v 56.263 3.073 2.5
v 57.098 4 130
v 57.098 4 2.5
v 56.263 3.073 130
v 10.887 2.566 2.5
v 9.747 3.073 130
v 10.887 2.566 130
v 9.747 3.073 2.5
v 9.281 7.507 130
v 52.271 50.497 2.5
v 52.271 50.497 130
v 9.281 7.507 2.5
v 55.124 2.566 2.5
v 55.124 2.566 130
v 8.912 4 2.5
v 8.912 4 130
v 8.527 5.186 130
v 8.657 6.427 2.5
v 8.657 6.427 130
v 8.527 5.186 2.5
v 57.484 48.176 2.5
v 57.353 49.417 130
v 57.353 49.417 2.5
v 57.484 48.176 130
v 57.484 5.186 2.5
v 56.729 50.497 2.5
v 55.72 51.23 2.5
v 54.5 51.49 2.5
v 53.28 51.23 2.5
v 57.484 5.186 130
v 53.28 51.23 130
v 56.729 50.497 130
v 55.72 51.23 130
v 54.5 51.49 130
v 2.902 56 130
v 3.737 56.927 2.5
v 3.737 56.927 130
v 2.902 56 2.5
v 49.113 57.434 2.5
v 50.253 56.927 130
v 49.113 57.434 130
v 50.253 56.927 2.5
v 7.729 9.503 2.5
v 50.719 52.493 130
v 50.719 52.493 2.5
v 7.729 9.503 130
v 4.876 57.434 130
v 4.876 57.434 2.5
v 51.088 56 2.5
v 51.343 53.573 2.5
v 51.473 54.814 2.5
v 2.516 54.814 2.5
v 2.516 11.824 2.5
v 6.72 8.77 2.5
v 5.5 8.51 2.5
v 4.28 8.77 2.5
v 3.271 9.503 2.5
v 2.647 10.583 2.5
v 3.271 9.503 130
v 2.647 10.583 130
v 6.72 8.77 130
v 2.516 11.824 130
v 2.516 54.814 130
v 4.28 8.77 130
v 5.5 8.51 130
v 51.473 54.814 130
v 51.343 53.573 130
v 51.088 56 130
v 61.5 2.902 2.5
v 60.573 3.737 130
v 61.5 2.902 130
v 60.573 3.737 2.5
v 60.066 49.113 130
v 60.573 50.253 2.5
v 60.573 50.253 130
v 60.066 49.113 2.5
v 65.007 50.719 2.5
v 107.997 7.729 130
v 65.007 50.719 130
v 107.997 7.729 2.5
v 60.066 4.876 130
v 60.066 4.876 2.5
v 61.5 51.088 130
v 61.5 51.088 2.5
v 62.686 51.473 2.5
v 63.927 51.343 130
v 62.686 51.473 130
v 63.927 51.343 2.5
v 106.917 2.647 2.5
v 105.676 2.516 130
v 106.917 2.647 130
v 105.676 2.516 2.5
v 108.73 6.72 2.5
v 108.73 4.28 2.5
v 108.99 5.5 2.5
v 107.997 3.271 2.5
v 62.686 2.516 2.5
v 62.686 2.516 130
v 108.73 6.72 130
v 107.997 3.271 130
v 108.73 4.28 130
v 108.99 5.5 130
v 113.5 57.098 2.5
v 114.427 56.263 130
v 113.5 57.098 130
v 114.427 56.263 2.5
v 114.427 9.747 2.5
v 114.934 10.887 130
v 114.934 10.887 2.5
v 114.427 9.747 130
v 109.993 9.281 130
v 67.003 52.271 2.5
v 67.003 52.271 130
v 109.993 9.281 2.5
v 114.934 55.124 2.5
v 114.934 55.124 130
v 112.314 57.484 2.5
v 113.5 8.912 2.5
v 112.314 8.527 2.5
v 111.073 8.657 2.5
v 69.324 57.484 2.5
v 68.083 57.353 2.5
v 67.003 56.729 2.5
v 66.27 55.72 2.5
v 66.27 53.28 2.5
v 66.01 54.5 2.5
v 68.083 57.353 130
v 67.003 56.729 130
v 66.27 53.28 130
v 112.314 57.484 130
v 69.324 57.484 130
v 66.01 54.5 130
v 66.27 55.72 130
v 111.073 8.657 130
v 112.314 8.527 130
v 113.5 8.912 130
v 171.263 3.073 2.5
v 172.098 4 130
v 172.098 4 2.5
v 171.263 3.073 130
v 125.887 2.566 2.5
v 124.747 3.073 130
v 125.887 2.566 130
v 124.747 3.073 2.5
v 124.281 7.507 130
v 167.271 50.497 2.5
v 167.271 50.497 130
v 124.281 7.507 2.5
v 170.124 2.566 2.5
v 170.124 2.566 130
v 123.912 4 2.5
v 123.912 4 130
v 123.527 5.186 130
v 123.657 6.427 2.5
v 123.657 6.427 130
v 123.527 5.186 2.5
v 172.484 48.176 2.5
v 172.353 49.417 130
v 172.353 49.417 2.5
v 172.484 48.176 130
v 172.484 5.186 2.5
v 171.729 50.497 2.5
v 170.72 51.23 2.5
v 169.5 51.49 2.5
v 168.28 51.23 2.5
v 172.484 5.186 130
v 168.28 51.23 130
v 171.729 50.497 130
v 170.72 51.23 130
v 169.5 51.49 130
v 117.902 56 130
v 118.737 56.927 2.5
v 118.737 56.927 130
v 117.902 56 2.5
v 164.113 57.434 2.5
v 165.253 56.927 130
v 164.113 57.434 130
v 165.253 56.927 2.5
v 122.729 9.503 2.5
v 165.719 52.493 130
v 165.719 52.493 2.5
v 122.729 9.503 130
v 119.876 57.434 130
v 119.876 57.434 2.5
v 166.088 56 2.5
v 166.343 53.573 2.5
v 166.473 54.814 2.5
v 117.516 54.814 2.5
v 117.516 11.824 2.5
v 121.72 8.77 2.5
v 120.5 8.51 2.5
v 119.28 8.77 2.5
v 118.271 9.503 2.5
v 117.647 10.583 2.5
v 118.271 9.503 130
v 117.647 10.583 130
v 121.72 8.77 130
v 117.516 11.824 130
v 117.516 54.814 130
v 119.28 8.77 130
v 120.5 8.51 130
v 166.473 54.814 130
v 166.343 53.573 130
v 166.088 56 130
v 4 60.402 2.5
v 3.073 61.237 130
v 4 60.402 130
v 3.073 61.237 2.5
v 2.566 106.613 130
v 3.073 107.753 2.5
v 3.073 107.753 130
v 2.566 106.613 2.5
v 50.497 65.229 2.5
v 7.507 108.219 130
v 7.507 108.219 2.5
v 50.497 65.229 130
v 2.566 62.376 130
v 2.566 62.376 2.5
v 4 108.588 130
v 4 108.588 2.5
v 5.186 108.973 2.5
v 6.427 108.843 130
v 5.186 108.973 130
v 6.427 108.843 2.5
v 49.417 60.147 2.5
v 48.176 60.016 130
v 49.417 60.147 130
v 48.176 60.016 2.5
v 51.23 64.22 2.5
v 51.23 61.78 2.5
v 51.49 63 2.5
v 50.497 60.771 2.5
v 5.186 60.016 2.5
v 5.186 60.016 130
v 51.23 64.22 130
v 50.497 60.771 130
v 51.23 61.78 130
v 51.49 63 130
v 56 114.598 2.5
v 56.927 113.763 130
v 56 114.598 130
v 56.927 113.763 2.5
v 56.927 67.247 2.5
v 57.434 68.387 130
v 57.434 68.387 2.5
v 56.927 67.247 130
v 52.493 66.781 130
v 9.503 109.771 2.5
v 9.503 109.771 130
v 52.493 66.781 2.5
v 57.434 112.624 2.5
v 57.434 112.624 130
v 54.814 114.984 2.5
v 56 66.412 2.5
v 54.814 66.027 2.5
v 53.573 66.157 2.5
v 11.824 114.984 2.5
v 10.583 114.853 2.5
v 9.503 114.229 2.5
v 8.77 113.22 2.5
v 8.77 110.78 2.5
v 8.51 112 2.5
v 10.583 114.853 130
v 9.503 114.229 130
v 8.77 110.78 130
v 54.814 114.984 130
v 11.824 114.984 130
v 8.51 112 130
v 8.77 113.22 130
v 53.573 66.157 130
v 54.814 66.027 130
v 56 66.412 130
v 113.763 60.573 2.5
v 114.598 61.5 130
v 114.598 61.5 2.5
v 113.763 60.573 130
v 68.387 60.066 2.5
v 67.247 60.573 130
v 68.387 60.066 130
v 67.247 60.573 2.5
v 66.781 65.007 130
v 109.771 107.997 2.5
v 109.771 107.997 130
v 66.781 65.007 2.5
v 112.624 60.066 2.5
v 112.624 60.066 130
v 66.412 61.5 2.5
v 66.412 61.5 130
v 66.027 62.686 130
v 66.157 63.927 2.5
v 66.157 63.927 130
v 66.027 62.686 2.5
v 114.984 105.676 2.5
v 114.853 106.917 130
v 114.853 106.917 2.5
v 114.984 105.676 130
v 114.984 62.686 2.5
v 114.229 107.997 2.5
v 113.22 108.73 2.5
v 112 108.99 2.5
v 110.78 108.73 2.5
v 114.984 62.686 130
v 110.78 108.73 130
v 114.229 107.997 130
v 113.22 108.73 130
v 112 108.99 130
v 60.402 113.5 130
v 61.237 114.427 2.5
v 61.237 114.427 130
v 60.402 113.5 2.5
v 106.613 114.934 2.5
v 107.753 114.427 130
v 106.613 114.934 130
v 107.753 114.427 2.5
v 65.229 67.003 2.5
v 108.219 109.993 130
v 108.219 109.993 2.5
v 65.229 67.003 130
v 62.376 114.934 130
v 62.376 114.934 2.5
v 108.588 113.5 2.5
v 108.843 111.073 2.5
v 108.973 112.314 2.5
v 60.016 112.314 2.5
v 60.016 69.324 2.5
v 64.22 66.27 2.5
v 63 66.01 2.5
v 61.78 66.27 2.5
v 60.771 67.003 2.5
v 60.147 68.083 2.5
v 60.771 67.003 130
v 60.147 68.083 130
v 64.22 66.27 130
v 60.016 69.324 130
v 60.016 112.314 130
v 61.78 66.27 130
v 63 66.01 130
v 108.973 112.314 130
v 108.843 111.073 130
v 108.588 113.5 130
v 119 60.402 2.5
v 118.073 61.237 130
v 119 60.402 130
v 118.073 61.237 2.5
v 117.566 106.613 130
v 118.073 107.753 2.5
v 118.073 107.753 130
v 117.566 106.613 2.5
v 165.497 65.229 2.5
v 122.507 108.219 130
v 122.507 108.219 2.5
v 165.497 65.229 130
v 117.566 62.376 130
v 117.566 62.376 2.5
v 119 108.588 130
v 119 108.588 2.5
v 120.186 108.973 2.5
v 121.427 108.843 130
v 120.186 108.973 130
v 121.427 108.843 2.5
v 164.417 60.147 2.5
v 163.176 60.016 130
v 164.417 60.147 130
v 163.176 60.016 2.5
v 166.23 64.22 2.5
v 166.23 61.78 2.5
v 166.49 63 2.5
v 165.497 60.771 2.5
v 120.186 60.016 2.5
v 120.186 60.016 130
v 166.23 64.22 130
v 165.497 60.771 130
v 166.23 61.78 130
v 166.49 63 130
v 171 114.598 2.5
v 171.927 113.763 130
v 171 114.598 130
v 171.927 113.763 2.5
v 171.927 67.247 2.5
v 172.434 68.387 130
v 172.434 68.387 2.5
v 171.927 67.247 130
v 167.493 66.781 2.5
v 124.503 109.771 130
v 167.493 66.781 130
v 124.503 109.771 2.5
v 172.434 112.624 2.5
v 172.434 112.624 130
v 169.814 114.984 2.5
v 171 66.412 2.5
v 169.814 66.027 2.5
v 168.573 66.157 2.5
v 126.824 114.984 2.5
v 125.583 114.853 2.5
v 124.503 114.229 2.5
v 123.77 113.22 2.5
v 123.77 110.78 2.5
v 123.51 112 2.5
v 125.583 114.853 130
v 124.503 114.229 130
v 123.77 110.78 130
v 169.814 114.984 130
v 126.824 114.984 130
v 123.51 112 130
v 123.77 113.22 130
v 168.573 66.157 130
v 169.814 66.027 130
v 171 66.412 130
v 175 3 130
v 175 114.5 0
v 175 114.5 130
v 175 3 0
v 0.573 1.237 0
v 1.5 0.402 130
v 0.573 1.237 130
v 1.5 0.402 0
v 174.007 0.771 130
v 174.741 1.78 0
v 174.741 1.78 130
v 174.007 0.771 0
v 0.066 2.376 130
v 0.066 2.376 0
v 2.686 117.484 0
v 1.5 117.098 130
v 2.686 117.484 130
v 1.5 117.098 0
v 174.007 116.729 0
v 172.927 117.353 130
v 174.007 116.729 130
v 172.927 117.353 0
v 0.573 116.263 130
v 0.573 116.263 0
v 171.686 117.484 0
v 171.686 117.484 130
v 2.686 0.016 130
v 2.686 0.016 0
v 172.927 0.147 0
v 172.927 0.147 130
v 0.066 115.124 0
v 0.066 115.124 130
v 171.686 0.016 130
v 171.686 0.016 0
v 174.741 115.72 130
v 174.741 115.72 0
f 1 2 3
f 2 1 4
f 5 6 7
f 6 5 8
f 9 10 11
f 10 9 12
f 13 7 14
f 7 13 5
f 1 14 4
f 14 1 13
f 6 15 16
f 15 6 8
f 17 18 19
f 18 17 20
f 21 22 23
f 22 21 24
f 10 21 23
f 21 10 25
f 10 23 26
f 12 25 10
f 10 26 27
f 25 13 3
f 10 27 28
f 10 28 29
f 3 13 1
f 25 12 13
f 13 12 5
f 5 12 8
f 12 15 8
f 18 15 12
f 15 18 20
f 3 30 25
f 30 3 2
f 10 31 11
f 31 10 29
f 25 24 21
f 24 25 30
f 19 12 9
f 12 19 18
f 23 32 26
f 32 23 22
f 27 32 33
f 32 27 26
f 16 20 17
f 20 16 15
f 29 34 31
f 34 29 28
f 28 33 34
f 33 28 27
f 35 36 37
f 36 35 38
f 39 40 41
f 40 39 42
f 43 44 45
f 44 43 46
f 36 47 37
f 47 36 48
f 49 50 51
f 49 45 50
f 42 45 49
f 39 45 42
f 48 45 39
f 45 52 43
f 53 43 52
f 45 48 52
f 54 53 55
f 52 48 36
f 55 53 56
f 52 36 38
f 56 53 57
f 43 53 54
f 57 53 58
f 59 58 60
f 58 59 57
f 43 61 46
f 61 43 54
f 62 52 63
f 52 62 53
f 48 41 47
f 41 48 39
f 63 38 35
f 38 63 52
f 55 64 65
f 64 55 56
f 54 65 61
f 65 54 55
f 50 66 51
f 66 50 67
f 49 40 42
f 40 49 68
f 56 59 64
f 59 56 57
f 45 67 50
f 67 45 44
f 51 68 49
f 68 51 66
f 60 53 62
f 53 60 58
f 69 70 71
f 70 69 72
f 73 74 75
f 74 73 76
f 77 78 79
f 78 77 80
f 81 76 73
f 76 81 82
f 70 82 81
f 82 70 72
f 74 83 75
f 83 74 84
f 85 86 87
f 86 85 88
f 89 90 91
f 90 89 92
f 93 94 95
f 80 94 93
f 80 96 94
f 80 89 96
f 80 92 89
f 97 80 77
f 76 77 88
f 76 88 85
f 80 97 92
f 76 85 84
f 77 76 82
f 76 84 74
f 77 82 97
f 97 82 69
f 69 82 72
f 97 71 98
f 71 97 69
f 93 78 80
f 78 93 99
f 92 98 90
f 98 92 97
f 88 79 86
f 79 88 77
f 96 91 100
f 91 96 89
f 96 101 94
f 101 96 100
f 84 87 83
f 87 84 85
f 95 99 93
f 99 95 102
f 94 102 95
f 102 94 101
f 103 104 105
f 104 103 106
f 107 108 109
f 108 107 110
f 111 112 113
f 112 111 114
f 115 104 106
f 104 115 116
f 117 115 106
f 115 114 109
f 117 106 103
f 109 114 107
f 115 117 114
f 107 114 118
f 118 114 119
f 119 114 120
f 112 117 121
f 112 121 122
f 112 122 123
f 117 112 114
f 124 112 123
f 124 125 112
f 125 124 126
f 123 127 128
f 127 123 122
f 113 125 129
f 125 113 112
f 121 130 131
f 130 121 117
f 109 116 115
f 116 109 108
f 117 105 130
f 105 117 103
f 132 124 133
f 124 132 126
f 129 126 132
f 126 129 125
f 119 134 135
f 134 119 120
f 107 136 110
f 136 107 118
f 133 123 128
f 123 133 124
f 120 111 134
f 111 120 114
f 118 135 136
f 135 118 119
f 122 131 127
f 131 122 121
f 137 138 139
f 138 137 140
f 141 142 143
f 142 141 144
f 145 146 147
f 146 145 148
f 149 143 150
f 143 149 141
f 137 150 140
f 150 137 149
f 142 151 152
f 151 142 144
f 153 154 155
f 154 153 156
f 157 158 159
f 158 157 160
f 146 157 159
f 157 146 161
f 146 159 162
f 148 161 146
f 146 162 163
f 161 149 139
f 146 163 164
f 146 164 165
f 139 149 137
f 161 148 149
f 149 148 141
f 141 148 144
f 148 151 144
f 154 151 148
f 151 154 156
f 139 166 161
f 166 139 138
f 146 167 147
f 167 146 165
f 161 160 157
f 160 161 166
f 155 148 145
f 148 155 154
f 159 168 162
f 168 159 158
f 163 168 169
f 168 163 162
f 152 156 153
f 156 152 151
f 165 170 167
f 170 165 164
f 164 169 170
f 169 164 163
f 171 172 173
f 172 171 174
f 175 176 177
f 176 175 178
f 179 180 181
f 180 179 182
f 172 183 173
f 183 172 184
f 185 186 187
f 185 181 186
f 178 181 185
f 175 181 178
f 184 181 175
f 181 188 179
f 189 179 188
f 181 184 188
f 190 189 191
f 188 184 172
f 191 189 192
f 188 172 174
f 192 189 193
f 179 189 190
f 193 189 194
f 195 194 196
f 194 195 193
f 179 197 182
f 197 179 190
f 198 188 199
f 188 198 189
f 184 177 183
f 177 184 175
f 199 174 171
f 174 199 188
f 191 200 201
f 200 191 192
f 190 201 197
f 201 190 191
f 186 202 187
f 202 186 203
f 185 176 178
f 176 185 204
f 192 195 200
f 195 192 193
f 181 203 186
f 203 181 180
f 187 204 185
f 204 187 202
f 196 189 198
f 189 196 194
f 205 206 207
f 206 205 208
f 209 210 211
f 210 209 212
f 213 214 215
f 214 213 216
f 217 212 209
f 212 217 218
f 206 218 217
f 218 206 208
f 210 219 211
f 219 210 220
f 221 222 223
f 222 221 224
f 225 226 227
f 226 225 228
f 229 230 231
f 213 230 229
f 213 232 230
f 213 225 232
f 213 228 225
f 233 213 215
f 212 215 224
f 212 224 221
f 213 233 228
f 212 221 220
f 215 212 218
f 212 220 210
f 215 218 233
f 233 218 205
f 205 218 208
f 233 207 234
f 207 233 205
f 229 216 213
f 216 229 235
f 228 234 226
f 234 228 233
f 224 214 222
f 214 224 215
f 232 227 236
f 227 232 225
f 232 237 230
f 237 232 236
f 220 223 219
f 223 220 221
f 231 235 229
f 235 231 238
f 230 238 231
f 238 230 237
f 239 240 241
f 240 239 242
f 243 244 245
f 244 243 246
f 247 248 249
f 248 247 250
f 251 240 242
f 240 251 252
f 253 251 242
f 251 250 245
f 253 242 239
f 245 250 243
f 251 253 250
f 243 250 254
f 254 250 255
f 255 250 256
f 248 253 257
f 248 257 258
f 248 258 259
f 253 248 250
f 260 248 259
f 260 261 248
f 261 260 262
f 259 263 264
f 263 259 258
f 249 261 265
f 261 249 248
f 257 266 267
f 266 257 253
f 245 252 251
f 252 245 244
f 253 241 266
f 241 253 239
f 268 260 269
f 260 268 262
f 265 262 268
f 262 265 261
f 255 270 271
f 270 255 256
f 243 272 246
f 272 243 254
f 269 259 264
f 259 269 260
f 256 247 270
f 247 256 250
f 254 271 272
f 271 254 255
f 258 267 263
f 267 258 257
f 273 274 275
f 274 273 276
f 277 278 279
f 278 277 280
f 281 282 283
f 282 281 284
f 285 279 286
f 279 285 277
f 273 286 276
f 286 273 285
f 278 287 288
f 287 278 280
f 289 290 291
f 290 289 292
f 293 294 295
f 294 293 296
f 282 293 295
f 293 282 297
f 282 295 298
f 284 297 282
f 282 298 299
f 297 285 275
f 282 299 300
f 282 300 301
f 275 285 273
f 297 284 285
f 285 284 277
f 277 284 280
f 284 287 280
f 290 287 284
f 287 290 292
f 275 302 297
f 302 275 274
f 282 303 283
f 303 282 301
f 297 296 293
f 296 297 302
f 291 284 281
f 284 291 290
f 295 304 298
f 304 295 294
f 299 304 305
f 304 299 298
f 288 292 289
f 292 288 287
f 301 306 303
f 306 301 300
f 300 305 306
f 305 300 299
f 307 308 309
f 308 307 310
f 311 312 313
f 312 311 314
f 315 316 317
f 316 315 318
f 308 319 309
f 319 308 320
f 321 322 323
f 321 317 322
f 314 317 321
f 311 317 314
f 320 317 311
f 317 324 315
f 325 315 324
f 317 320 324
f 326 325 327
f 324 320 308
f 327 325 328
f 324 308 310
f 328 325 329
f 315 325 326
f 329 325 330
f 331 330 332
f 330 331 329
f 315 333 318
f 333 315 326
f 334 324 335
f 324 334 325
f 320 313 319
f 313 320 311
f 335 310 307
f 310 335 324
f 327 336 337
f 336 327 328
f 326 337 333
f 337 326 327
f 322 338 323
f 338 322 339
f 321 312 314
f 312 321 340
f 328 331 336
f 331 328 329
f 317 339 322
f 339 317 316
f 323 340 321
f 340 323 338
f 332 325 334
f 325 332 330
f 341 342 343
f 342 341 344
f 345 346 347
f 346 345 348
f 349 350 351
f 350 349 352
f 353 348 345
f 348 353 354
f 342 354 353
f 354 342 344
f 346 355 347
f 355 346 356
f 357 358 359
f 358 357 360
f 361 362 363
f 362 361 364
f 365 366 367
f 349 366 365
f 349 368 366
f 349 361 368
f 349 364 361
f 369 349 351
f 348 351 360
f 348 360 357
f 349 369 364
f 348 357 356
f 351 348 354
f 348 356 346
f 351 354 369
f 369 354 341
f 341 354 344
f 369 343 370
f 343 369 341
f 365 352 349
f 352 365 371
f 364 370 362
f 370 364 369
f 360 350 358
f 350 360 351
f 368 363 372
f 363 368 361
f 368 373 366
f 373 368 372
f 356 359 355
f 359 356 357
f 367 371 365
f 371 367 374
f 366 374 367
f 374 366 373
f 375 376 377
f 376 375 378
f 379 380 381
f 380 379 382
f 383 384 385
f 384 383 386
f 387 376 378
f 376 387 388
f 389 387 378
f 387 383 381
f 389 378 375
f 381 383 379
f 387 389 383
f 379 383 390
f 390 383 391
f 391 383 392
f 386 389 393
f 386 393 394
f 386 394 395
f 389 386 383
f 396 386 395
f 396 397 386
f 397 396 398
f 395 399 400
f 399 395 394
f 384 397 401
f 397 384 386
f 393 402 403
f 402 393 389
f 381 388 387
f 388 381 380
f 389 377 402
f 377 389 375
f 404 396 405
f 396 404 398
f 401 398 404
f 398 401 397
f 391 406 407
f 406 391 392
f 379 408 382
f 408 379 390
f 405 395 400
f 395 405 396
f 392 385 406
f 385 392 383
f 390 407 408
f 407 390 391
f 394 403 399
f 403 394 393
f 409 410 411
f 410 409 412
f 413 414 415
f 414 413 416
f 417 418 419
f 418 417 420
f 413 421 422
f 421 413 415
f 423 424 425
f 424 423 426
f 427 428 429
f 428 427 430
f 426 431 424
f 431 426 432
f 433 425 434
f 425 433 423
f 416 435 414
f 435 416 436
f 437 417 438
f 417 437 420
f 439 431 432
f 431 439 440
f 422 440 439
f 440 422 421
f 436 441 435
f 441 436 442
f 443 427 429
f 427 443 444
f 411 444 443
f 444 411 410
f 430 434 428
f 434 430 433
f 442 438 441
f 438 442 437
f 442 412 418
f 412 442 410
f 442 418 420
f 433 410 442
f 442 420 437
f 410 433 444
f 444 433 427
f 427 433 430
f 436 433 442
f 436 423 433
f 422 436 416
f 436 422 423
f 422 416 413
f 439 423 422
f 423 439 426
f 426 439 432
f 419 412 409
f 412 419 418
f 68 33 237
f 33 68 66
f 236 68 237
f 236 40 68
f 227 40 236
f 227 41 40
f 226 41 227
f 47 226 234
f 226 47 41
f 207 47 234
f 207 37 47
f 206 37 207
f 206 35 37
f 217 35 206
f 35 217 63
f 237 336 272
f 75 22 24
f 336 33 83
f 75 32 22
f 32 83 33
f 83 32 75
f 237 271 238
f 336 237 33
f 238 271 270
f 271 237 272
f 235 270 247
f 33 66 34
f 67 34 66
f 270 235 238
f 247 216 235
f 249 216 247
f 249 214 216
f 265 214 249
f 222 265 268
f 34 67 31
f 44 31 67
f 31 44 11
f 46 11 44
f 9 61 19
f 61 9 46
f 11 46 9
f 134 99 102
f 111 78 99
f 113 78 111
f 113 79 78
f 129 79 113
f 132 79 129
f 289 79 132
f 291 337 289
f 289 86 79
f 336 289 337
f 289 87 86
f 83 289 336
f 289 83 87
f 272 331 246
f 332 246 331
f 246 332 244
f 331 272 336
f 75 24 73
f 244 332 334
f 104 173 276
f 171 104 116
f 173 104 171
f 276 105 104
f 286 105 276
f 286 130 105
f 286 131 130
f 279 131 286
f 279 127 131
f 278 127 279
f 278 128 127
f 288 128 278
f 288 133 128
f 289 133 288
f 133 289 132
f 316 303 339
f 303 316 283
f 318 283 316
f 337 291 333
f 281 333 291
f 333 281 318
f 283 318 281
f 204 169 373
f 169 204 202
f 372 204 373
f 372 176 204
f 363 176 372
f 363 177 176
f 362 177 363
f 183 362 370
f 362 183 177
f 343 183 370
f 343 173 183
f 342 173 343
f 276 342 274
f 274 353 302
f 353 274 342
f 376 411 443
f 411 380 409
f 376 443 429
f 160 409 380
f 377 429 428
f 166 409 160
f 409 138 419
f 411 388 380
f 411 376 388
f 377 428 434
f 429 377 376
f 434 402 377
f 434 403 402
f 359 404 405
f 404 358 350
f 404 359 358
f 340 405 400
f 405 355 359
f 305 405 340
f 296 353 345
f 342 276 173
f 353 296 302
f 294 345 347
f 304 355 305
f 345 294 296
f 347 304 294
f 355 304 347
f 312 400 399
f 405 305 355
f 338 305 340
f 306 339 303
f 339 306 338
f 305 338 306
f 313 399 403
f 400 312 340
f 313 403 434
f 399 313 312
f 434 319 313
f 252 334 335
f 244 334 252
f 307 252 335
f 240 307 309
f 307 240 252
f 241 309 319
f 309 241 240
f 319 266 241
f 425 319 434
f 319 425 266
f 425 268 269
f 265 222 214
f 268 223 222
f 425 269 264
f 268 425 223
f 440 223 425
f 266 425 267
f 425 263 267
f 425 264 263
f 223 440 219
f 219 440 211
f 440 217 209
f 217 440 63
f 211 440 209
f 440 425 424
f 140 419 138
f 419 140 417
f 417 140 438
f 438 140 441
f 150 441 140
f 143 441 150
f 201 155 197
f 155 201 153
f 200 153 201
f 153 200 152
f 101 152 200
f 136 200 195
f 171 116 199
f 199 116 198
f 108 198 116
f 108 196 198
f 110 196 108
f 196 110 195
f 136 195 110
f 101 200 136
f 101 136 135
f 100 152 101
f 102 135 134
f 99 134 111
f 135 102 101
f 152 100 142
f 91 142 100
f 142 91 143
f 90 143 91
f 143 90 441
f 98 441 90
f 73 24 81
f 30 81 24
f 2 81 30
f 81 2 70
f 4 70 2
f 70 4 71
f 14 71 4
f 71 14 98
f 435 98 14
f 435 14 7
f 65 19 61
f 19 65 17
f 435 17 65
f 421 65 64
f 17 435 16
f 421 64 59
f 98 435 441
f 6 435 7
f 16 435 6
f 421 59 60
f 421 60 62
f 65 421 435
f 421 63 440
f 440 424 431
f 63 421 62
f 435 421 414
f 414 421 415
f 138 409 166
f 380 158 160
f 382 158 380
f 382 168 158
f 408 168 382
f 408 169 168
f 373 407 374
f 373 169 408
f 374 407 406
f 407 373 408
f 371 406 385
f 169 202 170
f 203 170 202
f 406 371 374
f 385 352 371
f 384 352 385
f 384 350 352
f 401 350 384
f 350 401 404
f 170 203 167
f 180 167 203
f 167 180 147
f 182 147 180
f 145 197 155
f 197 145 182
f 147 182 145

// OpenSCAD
// Tool/Pen Organizer
// V1.1 by DonJuanito

// Width/Length of a 2 cells square (with one border)
cellWidth = 55; // [10:200]
// Number of rows
numRows = 2; // [1:15]
// Number of cells
numCols = 3; // [1:15]
// Radius of the vertical filets
cellRadius = 3; // [0:10]
// Width of the walls
width = 2.5; // [0.5:0.5:8]
// Heigth of the box
height = 130; // [10:200]
// Rotate the  mirrored cells ?
cellsRotation = 1; // [0, 1]

/* [Hidden] */

$fn=15;


// ### MAIN ########################################

Box(cellsRotation);

// ### MODULES #####################################

module TriUnit(ra, cl, h) {
    linear_extrude(height = h, center = false, convexity = 10) hull() {
    
        polygon(points = [[ra, cl], [ra, ra], [cl, ra]]);
        translate([ra, ra, 0]) circle(r = ra);
        translate([ra, cl, 0]) circle(r = ra);
        translate([cl, ra, 0]) circle(r = ra);
    }
}
module TriCell(l , h, m, ra, rot) {
    cd = 2*ra+m;
    co = sqrt((cd*cd)/2);
    cl = l - co - ra;

    translate([rot ? l : 0,0,0]) rotate([0,0,rot ? 90 : 0]) {
        TriUnit(ra, cl, h);
        translate([l,l,0]) rotate([0,0,180]) TriUnit(ra, cl, h);
    }
}

module Box(rotate) {
cw = (width+cellWidth)*numCols+width;
cl = (width+cellWidth)*numRows+width;
    difference() {
//        cube([cw, cl, height+width], center=false);
        linear_extrude(height = height, center = false, convexity = 10) hull() {
            translate([cellRadius,cellRadius,0]) square([cw - 2 * cellRadius, cl - 2 * cellRadius], center = false);
            translate([cellRadius, cellRadius, 0]) circle(r = cellRadius);
            translate([cellRadius, cl - cellRadius, 0]) circle(r = cellRadius);
            translate([cw - cellRadius, cl - cellRadius, 0]) circle(r = cellRadius);
            translate([cw - cellRadius, cellRadius, 0]) circle(r = cellRadius);
        }
        union() for (ro = [0 : numRows-1])
            for (co = [0 : numCols-1]) {
                translate([width+(cellWidth+width)*co,width+(cellWidth+width)*ro,width]) TriCell(l = cellWidth, h= height, m = width, ra = cellRadius, rot = rotate ? (((ro+co)%2) ? false : true) : false );
        }
    }
}
